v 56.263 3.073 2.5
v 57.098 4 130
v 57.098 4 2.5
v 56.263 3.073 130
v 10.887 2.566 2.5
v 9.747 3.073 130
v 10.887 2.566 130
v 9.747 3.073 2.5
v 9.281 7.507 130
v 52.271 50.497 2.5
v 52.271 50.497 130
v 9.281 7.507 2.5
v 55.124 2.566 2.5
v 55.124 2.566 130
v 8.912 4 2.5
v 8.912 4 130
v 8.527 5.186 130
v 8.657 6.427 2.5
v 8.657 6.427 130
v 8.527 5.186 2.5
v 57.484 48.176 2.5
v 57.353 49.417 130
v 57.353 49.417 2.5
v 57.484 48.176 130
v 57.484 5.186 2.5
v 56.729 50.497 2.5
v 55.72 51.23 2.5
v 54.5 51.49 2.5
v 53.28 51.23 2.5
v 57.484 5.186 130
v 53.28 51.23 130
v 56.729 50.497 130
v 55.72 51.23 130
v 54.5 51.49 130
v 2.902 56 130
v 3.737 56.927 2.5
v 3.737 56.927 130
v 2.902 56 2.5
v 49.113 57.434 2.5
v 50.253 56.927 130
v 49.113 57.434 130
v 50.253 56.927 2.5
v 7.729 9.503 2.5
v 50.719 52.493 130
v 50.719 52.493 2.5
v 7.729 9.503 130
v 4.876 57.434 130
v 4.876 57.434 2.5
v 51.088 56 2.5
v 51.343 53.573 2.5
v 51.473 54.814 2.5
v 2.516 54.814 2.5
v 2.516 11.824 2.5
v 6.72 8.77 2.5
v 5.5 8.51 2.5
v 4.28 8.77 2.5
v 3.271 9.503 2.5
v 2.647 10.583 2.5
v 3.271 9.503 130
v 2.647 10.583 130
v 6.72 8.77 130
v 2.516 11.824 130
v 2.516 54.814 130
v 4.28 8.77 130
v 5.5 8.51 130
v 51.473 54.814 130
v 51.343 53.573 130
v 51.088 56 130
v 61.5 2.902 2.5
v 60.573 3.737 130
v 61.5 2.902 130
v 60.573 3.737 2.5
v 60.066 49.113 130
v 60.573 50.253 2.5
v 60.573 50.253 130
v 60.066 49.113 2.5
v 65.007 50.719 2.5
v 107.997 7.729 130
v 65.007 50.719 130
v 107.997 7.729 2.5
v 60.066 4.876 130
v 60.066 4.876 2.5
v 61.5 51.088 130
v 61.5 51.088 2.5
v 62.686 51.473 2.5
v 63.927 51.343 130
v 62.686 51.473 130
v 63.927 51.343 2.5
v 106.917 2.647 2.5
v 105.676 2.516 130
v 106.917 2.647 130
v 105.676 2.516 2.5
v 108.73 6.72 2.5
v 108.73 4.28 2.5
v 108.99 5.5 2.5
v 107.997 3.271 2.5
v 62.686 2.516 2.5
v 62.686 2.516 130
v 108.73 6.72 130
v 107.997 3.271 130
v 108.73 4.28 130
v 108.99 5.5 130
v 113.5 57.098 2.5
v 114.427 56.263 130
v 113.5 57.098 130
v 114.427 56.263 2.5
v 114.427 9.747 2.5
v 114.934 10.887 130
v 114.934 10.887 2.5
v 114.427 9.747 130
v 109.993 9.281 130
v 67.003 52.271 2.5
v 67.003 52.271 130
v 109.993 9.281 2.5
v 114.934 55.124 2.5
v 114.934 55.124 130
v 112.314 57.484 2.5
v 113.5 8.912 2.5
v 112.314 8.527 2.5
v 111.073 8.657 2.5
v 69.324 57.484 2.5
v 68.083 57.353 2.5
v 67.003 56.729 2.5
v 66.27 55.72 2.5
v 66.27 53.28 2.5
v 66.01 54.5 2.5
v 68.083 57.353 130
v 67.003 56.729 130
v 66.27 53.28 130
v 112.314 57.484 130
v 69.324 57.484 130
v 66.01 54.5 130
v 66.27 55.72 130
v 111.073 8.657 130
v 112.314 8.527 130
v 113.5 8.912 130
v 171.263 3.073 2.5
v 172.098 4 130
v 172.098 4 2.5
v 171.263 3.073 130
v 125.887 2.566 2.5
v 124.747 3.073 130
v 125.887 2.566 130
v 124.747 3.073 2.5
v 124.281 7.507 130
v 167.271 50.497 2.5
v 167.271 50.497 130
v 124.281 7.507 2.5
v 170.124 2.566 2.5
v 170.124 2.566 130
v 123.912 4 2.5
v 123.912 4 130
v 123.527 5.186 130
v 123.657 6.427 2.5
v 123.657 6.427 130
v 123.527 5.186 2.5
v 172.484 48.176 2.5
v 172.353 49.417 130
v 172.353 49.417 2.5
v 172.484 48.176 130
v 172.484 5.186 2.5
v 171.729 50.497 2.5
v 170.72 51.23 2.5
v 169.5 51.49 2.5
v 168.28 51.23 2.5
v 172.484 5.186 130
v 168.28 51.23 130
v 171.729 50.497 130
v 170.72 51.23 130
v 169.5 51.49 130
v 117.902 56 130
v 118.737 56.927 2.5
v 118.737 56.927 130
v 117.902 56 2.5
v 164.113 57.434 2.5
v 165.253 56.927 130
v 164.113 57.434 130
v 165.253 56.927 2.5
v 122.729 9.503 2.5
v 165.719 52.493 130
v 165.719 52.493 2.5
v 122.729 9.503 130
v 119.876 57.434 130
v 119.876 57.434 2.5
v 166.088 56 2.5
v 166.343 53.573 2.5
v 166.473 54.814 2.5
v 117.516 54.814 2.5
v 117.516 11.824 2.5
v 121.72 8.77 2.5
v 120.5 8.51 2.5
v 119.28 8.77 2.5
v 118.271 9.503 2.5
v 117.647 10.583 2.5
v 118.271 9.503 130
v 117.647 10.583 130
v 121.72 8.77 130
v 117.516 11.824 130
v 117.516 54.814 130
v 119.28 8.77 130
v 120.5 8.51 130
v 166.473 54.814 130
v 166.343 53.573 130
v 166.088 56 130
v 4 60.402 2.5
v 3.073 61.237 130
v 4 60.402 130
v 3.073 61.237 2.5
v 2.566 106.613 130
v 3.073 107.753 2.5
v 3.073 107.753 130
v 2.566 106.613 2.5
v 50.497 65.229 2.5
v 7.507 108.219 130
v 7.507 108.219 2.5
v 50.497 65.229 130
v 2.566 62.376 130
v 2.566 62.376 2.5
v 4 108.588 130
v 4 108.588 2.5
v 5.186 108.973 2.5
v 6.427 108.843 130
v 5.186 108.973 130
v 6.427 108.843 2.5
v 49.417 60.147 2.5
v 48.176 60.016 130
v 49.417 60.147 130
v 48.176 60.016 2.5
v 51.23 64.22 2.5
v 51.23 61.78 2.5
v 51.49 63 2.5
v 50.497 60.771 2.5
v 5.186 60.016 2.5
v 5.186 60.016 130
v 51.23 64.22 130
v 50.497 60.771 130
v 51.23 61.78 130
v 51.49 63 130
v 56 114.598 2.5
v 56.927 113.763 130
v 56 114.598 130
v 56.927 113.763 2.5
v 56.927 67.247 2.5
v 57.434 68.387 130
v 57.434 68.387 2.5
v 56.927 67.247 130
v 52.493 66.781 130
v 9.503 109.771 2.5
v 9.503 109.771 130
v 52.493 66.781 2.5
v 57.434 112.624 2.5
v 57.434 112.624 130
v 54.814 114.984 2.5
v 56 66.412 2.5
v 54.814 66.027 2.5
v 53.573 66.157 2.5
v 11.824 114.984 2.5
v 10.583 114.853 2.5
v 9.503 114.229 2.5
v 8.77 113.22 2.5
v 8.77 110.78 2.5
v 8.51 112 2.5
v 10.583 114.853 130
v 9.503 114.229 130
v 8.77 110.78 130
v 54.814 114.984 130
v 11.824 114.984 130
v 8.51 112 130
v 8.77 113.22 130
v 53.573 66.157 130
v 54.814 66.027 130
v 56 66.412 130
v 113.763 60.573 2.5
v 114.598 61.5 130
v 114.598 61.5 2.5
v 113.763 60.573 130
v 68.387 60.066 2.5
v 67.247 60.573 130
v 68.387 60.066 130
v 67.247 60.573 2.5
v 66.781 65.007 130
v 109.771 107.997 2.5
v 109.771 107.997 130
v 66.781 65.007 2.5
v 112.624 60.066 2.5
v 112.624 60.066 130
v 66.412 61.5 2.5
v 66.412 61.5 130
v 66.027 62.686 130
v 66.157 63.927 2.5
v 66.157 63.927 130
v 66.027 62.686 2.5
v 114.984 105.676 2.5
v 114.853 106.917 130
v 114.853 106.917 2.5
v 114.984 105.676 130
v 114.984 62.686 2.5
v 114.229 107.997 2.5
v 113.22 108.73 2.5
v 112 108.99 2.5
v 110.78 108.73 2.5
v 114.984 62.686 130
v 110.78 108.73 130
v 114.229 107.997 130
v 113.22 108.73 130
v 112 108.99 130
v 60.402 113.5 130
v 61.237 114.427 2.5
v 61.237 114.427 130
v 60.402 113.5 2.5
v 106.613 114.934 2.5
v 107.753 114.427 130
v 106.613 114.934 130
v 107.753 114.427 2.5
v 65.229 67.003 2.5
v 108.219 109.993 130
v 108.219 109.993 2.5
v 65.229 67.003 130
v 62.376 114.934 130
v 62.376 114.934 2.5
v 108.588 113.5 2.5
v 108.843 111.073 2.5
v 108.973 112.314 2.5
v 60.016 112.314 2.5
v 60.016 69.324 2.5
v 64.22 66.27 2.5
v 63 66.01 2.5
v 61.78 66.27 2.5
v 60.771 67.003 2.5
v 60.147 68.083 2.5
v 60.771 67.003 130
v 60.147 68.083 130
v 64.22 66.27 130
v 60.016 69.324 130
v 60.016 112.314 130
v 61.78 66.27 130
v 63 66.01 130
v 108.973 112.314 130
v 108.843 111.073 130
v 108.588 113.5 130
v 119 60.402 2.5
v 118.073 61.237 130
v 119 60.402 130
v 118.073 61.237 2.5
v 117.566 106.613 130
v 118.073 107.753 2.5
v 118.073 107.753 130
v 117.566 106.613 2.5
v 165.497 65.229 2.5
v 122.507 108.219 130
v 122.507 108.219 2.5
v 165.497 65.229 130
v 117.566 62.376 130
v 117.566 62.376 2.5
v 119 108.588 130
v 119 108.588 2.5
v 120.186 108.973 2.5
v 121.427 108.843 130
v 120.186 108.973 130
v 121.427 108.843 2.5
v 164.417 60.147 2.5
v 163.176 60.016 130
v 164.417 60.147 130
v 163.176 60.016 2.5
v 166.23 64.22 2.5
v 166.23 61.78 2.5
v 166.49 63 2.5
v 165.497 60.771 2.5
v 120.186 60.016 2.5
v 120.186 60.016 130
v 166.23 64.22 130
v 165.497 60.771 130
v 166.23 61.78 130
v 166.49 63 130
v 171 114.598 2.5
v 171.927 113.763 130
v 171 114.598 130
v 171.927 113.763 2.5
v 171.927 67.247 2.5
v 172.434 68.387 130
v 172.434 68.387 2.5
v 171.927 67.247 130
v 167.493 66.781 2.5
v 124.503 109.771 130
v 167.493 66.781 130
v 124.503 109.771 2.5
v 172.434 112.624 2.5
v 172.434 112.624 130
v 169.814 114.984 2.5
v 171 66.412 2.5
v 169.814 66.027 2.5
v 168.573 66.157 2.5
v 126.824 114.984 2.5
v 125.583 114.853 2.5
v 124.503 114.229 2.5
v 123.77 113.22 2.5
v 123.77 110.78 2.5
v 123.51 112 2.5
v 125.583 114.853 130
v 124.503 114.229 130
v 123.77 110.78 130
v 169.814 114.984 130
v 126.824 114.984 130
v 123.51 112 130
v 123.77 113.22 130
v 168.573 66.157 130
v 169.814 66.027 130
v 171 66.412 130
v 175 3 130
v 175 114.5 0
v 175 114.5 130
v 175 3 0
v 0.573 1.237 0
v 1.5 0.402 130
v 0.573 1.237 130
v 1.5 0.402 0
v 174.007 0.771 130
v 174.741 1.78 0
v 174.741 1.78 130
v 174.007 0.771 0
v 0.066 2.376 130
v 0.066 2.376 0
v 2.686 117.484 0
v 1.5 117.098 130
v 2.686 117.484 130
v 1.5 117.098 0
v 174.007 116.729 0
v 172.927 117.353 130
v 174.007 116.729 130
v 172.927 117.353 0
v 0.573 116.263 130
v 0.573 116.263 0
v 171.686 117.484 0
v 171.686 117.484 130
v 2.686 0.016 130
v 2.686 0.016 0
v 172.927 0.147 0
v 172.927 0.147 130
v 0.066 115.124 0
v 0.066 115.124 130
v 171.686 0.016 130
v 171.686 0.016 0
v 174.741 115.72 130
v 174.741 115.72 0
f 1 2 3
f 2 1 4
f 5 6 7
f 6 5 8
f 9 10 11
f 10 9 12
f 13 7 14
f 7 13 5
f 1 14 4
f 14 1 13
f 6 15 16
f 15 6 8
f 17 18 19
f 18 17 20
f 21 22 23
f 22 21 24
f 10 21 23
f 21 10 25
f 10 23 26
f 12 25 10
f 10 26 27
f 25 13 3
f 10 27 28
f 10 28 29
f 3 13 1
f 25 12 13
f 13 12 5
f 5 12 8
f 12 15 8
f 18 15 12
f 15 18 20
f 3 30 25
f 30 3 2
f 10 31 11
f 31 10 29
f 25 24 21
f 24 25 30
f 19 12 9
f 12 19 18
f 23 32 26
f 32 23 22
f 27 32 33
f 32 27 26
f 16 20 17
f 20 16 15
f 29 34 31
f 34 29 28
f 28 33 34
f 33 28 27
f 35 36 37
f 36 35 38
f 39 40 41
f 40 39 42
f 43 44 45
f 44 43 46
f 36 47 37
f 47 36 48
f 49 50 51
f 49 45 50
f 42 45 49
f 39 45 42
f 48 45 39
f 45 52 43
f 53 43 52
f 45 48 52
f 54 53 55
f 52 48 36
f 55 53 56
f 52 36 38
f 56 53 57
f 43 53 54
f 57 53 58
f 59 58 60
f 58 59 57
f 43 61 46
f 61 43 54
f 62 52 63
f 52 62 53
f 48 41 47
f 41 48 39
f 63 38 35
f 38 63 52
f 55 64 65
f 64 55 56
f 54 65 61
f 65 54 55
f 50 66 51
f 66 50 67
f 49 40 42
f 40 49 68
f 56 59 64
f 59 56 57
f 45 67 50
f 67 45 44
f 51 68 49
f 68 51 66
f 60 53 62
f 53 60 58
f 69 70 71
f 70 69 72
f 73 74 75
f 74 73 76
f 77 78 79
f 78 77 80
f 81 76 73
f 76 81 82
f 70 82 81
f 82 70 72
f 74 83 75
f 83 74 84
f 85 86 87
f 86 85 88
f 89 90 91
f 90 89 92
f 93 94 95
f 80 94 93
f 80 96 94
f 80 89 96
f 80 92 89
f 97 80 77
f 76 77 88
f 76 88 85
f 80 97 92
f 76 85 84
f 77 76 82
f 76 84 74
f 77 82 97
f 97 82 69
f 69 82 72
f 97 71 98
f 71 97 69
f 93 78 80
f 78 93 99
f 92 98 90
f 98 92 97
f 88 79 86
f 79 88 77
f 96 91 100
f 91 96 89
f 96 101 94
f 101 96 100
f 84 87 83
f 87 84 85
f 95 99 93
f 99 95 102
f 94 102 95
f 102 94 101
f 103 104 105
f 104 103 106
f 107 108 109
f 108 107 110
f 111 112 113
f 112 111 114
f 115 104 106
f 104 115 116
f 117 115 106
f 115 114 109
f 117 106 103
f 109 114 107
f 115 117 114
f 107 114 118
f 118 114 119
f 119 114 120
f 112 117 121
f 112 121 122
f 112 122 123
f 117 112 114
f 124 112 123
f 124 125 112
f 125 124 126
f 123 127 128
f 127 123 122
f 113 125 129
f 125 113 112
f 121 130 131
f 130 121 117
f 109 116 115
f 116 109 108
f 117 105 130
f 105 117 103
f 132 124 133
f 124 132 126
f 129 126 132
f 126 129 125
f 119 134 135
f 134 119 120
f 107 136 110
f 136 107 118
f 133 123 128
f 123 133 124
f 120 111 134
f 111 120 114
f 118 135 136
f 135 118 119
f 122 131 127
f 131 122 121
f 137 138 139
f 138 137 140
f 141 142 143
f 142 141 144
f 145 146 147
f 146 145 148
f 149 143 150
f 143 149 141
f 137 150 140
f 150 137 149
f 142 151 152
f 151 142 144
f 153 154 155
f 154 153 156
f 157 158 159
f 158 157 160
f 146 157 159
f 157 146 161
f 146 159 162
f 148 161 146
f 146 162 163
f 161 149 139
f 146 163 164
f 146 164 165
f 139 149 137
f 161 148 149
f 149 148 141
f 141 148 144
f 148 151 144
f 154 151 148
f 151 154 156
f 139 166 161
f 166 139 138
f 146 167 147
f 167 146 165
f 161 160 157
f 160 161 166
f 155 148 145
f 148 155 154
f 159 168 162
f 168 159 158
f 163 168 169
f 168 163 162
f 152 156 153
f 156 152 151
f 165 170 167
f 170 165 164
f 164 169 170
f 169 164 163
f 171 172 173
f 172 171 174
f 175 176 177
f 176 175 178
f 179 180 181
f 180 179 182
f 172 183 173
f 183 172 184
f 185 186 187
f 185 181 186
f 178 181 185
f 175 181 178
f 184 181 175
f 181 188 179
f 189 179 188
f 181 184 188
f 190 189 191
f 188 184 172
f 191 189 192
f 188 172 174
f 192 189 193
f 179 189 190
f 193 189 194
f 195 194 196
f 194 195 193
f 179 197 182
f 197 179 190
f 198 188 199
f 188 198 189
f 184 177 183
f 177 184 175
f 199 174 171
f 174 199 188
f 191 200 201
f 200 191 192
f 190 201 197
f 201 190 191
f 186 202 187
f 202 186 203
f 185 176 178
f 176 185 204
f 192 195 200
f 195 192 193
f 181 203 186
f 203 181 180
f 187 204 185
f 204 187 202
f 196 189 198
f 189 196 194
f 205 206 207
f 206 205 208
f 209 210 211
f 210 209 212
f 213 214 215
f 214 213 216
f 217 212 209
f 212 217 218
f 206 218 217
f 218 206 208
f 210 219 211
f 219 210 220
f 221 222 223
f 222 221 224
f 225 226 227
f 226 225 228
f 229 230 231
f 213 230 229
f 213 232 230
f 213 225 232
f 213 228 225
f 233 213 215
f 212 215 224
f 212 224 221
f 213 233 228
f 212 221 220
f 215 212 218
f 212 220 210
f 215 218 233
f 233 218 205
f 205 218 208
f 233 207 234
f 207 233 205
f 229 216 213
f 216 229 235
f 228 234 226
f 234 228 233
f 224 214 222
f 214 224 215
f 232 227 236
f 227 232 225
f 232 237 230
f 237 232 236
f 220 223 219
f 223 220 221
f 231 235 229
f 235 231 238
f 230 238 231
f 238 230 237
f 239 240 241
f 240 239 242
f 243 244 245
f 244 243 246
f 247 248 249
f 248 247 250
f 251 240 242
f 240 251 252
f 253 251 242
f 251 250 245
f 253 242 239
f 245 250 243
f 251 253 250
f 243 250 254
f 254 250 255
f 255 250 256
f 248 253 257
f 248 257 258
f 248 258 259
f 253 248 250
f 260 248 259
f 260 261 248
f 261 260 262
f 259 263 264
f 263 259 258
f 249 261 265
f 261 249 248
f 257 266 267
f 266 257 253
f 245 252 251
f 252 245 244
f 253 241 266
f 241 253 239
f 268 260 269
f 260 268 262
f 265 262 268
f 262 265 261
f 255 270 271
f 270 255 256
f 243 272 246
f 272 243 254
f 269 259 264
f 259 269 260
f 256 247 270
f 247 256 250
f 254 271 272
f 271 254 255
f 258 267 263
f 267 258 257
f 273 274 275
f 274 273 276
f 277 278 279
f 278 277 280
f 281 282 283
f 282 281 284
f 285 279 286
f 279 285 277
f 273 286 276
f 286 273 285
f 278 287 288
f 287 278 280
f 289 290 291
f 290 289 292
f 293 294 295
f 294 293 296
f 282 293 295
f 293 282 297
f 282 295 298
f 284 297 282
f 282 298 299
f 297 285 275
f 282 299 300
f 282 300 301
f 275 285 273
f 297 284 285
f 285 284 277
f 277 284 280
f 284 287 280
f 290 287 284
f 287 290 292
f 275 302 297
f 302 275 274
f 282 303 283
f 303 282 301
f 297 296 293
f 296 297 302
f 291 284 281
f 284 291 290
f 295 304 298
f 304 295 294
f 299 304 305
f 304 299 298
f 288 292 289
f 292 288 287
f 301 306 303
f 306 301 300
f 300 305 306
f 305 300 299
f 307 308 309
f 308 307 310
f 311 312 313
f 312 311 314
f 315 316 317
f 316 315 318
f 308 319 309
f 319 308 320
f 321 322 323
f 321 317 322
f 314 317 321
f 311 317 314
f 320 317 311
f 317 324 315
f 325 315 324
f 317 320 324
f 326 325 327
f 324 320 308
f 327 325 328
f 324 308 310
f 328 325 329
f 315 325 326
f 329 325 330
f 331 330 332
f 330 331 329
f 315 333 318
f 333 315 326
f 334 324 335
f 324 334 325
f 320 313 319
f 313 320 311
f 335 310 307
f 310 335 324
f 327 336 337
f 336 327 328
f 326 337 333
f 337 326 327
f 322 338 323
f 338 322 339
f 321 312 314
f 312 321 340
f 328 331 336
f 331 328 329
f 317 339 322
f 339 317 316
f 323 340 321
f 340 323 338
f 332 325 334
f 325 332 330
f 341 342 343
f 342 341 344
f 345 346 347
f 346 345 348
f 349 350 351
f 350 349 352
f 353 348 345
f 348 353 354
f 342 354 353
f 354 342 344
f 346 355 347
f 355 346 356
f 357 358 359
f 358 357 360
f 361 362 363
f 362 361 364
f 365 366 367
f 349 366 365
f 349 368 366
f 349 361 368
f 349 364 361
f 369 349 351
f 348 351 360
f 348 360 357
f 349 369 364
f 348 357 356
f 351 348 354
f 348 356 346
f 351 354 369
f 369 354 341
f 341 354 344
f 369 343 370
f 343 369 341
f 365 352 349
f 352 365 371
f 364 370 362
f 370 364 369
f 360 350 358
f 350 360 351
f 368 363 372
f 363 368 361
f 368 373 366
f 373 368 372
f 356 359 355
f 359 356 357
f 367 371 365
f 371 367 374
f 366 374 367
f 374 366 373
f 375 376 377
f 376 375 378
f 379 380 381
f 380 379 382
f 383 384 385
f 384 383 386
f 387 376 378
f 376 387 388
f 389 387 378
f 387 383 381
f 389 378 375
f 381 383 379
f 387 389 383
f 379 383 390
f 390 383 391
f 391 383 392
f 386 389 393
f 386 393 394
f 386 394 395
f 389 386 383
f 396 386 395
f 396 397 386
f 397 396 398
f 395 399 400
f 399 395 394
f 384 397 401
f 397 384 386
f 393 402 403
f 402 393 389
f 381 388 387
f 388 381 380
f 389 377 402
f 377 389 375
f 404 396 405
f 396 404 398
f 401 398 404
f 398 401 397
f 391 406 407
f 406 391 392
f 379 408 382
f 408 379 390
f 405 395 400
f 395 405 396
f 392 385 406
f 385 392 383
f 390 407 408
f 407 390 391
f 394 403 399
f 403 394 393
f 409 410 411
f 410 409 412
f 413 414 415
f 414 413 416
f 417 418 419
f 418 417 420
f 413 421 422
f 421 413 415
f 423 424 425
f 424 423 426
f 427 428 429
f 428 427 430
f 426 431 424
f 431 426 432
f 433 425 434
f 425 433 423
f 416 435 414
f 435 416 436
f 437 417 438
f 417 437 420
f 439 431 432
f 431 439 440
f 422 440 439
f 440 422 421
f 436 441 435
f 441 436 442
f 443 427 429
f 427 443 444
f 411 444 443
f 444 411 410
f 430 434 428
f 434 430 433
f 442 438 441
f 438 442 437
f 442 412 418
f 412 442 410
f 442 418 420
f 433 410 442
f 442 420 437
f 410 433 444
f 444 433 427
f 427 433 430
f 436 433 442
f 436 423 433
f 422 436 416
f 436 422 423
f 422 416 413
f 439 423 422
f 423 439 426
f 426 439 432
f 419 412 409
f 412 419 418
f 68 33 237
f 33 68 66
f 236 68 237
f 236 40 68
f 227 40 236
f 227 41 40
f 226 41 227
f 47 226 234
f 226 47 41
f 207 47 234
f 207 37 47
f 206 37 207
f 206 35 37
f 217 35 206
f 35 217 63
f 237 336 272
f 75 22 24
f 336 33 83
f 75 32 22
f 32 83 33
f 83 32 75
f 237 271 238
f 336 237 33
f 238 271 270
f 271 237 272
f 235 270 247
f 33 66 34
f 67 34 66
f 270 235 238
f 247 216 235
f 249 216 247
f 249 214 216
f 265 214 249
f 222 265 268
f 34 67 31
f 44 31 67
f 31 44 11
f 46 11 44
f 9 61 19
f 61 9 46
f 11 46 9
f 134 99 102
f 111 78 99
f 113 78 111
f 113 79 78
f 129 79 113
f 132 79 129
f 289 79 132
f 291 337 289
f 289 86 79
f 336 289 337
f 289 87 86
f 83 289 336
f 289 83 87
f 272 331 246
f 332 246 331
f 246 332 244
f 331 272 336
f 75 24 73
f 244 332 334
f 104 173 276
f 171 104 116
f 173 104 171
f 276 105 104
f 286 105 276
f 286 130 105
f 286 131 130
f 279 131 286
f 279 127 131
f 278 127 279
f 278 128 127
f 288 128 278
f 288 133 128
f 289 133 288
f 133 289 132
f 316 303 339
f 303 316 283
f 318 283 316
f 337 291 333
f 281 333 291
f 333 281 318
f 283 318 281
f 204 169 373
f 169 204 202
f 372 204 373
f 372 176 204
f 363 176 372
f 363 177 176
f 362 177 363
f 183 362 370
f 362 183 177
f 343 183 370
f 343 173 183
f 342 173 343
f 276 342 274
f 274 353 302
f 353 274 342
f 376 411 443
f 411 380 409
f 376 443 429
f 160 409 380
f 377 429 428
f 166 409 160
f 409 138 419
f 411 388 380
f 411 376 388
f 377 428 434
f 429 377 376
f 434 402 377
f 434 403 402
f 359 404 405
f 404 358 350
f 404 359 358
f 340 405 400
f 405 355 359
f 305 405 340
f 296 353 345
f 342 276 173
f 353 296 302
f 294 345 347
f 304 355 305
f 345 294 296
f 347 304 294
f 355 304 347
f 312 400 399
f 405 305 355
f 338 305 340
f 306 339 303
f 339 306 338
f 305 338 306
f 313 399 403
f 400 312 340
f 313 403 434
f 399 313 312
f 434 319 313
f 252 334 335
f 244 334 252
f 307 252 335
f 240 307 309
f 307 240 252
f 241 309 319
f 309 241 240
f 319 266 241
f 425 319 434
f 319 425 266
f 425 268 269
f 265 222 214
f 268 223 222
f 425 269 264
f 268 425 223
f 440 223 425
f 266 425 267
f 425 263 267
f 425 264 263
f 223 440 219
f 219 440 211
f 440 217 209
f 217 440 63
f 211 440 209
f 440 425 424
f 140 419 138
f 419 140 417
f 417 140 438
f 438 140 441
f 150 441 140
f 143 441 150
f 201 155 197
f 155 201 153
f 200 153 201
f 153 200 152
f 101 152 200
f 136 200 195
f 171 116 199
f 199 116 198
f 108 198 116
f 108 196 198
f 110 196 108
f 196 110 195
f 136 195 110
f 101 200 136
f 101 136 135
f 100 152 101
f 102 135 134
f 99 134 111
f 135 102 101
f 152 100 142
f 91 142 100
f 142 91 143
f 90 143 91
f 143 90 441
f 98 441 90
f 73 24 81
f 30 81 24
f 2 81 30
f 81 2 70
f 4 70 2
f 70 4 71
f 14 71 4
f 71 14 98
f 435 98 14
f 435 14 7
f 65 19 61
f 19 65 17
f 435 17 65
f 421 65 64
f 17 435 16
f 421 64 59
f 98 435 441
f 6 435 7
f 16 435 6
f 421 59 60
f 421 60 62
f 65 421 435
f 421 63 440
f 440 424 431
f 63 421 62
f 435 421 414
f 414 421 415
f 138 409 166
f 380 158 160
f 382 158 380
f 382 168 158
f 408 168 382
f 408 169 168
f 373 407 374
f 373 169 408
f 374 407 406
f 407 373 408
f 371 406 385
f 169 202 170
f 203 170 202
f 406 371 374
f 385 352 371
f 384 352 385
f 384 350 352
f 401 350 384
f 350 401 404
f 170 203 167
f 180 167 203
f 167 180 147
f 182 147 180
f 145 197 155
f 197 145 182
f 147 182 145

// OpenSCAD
// Tool/Pen Organizer
// V1.1 by DonJuanito

// Width/Length of a 2 cells square (with one border)
cellWidth = 55; // [10:200]
// Number of rows
numRows = 2; // [1:15]
// Number of cells
numCols = 3; // [1:15]
// Radius of the vertical filets
cellRadius = 3; // [0:10]
// Width of the walls
width = 2.5; // [0.5:0.5:8]
// Heigth of the box
height = 130; // [10:200]
// Rotate the  mirrored cells ?
cellsRotation = 1; // [0, 1]

/* [Hidden] */

$fn=15;


// ### MAIN ########################################

Box(cellsRotation);

// ### MODULES #####################################

module TriUnit(ra, cl, h) {
    linear_extrude(height = h, center = false, convexity = 10) hull() {
    
        polygon(points = [[ra, cl], [ra, ra], [cl, ra]]);
        translate([ra, ra, 0]) circle(r = ra);
        translate([ra, cl, 0]) circle(r = ra);
        translate([cl, ra, 0]) circle(r = ra);
    }
}
module TriCell(l , h, m, ra, rot) {
    cd = 2*ra+m;
    co = sqrt((cd*cd)/2);
    cl = l - co - ra;

    translate([rot ? l : 0,0,0]) rotate([0,0,rot ? 90 : 0]) {
        TriUnit(ra, cl, h);
        translate([l,l,0]) rotate([0,0,180]) TriUnit(ra, cl, h);
    }
}

module Box(rotate) {
cw = (width+cellWidth)*numCols+width;
cl = (width+cellWidth)*numRows+width;
    difference() {
//        cube([cw, cl, height+width], center=false);
        linear_extrude(height = height, center = false, convexity = 10) hull() {
            translate([cellRadius,cellRadius,0]) square([cw - 2 * cellRadius, cl - 2 * cellRadius], center = false);
            translate([cellRadius, cellRadius, 0]) circle(r = cellRadius);
            translate([cellRadius, cl - cellRadius, 0]) circle(r = cellRadius);
            translate([cw - cellRadius, cl - cellRadius, 0]) circle(r = cellRadius);
            translate([cw - cellRadius, cellRadius, 0]) circle(r = cellRadius);
        }
        union() for (ro = [0 : numRows-1])
            for (co = [0 : numCols-1]) {
                translate([width+(cellWidth+width)*co,width+(cellWidth+width)*ro,width]) TriCell(l = cellWidth, h= height, m = width, ra = cellRadius, rot = rotate ? (((ro+co)%2) ? false : true) : false );
        }
    }
}
